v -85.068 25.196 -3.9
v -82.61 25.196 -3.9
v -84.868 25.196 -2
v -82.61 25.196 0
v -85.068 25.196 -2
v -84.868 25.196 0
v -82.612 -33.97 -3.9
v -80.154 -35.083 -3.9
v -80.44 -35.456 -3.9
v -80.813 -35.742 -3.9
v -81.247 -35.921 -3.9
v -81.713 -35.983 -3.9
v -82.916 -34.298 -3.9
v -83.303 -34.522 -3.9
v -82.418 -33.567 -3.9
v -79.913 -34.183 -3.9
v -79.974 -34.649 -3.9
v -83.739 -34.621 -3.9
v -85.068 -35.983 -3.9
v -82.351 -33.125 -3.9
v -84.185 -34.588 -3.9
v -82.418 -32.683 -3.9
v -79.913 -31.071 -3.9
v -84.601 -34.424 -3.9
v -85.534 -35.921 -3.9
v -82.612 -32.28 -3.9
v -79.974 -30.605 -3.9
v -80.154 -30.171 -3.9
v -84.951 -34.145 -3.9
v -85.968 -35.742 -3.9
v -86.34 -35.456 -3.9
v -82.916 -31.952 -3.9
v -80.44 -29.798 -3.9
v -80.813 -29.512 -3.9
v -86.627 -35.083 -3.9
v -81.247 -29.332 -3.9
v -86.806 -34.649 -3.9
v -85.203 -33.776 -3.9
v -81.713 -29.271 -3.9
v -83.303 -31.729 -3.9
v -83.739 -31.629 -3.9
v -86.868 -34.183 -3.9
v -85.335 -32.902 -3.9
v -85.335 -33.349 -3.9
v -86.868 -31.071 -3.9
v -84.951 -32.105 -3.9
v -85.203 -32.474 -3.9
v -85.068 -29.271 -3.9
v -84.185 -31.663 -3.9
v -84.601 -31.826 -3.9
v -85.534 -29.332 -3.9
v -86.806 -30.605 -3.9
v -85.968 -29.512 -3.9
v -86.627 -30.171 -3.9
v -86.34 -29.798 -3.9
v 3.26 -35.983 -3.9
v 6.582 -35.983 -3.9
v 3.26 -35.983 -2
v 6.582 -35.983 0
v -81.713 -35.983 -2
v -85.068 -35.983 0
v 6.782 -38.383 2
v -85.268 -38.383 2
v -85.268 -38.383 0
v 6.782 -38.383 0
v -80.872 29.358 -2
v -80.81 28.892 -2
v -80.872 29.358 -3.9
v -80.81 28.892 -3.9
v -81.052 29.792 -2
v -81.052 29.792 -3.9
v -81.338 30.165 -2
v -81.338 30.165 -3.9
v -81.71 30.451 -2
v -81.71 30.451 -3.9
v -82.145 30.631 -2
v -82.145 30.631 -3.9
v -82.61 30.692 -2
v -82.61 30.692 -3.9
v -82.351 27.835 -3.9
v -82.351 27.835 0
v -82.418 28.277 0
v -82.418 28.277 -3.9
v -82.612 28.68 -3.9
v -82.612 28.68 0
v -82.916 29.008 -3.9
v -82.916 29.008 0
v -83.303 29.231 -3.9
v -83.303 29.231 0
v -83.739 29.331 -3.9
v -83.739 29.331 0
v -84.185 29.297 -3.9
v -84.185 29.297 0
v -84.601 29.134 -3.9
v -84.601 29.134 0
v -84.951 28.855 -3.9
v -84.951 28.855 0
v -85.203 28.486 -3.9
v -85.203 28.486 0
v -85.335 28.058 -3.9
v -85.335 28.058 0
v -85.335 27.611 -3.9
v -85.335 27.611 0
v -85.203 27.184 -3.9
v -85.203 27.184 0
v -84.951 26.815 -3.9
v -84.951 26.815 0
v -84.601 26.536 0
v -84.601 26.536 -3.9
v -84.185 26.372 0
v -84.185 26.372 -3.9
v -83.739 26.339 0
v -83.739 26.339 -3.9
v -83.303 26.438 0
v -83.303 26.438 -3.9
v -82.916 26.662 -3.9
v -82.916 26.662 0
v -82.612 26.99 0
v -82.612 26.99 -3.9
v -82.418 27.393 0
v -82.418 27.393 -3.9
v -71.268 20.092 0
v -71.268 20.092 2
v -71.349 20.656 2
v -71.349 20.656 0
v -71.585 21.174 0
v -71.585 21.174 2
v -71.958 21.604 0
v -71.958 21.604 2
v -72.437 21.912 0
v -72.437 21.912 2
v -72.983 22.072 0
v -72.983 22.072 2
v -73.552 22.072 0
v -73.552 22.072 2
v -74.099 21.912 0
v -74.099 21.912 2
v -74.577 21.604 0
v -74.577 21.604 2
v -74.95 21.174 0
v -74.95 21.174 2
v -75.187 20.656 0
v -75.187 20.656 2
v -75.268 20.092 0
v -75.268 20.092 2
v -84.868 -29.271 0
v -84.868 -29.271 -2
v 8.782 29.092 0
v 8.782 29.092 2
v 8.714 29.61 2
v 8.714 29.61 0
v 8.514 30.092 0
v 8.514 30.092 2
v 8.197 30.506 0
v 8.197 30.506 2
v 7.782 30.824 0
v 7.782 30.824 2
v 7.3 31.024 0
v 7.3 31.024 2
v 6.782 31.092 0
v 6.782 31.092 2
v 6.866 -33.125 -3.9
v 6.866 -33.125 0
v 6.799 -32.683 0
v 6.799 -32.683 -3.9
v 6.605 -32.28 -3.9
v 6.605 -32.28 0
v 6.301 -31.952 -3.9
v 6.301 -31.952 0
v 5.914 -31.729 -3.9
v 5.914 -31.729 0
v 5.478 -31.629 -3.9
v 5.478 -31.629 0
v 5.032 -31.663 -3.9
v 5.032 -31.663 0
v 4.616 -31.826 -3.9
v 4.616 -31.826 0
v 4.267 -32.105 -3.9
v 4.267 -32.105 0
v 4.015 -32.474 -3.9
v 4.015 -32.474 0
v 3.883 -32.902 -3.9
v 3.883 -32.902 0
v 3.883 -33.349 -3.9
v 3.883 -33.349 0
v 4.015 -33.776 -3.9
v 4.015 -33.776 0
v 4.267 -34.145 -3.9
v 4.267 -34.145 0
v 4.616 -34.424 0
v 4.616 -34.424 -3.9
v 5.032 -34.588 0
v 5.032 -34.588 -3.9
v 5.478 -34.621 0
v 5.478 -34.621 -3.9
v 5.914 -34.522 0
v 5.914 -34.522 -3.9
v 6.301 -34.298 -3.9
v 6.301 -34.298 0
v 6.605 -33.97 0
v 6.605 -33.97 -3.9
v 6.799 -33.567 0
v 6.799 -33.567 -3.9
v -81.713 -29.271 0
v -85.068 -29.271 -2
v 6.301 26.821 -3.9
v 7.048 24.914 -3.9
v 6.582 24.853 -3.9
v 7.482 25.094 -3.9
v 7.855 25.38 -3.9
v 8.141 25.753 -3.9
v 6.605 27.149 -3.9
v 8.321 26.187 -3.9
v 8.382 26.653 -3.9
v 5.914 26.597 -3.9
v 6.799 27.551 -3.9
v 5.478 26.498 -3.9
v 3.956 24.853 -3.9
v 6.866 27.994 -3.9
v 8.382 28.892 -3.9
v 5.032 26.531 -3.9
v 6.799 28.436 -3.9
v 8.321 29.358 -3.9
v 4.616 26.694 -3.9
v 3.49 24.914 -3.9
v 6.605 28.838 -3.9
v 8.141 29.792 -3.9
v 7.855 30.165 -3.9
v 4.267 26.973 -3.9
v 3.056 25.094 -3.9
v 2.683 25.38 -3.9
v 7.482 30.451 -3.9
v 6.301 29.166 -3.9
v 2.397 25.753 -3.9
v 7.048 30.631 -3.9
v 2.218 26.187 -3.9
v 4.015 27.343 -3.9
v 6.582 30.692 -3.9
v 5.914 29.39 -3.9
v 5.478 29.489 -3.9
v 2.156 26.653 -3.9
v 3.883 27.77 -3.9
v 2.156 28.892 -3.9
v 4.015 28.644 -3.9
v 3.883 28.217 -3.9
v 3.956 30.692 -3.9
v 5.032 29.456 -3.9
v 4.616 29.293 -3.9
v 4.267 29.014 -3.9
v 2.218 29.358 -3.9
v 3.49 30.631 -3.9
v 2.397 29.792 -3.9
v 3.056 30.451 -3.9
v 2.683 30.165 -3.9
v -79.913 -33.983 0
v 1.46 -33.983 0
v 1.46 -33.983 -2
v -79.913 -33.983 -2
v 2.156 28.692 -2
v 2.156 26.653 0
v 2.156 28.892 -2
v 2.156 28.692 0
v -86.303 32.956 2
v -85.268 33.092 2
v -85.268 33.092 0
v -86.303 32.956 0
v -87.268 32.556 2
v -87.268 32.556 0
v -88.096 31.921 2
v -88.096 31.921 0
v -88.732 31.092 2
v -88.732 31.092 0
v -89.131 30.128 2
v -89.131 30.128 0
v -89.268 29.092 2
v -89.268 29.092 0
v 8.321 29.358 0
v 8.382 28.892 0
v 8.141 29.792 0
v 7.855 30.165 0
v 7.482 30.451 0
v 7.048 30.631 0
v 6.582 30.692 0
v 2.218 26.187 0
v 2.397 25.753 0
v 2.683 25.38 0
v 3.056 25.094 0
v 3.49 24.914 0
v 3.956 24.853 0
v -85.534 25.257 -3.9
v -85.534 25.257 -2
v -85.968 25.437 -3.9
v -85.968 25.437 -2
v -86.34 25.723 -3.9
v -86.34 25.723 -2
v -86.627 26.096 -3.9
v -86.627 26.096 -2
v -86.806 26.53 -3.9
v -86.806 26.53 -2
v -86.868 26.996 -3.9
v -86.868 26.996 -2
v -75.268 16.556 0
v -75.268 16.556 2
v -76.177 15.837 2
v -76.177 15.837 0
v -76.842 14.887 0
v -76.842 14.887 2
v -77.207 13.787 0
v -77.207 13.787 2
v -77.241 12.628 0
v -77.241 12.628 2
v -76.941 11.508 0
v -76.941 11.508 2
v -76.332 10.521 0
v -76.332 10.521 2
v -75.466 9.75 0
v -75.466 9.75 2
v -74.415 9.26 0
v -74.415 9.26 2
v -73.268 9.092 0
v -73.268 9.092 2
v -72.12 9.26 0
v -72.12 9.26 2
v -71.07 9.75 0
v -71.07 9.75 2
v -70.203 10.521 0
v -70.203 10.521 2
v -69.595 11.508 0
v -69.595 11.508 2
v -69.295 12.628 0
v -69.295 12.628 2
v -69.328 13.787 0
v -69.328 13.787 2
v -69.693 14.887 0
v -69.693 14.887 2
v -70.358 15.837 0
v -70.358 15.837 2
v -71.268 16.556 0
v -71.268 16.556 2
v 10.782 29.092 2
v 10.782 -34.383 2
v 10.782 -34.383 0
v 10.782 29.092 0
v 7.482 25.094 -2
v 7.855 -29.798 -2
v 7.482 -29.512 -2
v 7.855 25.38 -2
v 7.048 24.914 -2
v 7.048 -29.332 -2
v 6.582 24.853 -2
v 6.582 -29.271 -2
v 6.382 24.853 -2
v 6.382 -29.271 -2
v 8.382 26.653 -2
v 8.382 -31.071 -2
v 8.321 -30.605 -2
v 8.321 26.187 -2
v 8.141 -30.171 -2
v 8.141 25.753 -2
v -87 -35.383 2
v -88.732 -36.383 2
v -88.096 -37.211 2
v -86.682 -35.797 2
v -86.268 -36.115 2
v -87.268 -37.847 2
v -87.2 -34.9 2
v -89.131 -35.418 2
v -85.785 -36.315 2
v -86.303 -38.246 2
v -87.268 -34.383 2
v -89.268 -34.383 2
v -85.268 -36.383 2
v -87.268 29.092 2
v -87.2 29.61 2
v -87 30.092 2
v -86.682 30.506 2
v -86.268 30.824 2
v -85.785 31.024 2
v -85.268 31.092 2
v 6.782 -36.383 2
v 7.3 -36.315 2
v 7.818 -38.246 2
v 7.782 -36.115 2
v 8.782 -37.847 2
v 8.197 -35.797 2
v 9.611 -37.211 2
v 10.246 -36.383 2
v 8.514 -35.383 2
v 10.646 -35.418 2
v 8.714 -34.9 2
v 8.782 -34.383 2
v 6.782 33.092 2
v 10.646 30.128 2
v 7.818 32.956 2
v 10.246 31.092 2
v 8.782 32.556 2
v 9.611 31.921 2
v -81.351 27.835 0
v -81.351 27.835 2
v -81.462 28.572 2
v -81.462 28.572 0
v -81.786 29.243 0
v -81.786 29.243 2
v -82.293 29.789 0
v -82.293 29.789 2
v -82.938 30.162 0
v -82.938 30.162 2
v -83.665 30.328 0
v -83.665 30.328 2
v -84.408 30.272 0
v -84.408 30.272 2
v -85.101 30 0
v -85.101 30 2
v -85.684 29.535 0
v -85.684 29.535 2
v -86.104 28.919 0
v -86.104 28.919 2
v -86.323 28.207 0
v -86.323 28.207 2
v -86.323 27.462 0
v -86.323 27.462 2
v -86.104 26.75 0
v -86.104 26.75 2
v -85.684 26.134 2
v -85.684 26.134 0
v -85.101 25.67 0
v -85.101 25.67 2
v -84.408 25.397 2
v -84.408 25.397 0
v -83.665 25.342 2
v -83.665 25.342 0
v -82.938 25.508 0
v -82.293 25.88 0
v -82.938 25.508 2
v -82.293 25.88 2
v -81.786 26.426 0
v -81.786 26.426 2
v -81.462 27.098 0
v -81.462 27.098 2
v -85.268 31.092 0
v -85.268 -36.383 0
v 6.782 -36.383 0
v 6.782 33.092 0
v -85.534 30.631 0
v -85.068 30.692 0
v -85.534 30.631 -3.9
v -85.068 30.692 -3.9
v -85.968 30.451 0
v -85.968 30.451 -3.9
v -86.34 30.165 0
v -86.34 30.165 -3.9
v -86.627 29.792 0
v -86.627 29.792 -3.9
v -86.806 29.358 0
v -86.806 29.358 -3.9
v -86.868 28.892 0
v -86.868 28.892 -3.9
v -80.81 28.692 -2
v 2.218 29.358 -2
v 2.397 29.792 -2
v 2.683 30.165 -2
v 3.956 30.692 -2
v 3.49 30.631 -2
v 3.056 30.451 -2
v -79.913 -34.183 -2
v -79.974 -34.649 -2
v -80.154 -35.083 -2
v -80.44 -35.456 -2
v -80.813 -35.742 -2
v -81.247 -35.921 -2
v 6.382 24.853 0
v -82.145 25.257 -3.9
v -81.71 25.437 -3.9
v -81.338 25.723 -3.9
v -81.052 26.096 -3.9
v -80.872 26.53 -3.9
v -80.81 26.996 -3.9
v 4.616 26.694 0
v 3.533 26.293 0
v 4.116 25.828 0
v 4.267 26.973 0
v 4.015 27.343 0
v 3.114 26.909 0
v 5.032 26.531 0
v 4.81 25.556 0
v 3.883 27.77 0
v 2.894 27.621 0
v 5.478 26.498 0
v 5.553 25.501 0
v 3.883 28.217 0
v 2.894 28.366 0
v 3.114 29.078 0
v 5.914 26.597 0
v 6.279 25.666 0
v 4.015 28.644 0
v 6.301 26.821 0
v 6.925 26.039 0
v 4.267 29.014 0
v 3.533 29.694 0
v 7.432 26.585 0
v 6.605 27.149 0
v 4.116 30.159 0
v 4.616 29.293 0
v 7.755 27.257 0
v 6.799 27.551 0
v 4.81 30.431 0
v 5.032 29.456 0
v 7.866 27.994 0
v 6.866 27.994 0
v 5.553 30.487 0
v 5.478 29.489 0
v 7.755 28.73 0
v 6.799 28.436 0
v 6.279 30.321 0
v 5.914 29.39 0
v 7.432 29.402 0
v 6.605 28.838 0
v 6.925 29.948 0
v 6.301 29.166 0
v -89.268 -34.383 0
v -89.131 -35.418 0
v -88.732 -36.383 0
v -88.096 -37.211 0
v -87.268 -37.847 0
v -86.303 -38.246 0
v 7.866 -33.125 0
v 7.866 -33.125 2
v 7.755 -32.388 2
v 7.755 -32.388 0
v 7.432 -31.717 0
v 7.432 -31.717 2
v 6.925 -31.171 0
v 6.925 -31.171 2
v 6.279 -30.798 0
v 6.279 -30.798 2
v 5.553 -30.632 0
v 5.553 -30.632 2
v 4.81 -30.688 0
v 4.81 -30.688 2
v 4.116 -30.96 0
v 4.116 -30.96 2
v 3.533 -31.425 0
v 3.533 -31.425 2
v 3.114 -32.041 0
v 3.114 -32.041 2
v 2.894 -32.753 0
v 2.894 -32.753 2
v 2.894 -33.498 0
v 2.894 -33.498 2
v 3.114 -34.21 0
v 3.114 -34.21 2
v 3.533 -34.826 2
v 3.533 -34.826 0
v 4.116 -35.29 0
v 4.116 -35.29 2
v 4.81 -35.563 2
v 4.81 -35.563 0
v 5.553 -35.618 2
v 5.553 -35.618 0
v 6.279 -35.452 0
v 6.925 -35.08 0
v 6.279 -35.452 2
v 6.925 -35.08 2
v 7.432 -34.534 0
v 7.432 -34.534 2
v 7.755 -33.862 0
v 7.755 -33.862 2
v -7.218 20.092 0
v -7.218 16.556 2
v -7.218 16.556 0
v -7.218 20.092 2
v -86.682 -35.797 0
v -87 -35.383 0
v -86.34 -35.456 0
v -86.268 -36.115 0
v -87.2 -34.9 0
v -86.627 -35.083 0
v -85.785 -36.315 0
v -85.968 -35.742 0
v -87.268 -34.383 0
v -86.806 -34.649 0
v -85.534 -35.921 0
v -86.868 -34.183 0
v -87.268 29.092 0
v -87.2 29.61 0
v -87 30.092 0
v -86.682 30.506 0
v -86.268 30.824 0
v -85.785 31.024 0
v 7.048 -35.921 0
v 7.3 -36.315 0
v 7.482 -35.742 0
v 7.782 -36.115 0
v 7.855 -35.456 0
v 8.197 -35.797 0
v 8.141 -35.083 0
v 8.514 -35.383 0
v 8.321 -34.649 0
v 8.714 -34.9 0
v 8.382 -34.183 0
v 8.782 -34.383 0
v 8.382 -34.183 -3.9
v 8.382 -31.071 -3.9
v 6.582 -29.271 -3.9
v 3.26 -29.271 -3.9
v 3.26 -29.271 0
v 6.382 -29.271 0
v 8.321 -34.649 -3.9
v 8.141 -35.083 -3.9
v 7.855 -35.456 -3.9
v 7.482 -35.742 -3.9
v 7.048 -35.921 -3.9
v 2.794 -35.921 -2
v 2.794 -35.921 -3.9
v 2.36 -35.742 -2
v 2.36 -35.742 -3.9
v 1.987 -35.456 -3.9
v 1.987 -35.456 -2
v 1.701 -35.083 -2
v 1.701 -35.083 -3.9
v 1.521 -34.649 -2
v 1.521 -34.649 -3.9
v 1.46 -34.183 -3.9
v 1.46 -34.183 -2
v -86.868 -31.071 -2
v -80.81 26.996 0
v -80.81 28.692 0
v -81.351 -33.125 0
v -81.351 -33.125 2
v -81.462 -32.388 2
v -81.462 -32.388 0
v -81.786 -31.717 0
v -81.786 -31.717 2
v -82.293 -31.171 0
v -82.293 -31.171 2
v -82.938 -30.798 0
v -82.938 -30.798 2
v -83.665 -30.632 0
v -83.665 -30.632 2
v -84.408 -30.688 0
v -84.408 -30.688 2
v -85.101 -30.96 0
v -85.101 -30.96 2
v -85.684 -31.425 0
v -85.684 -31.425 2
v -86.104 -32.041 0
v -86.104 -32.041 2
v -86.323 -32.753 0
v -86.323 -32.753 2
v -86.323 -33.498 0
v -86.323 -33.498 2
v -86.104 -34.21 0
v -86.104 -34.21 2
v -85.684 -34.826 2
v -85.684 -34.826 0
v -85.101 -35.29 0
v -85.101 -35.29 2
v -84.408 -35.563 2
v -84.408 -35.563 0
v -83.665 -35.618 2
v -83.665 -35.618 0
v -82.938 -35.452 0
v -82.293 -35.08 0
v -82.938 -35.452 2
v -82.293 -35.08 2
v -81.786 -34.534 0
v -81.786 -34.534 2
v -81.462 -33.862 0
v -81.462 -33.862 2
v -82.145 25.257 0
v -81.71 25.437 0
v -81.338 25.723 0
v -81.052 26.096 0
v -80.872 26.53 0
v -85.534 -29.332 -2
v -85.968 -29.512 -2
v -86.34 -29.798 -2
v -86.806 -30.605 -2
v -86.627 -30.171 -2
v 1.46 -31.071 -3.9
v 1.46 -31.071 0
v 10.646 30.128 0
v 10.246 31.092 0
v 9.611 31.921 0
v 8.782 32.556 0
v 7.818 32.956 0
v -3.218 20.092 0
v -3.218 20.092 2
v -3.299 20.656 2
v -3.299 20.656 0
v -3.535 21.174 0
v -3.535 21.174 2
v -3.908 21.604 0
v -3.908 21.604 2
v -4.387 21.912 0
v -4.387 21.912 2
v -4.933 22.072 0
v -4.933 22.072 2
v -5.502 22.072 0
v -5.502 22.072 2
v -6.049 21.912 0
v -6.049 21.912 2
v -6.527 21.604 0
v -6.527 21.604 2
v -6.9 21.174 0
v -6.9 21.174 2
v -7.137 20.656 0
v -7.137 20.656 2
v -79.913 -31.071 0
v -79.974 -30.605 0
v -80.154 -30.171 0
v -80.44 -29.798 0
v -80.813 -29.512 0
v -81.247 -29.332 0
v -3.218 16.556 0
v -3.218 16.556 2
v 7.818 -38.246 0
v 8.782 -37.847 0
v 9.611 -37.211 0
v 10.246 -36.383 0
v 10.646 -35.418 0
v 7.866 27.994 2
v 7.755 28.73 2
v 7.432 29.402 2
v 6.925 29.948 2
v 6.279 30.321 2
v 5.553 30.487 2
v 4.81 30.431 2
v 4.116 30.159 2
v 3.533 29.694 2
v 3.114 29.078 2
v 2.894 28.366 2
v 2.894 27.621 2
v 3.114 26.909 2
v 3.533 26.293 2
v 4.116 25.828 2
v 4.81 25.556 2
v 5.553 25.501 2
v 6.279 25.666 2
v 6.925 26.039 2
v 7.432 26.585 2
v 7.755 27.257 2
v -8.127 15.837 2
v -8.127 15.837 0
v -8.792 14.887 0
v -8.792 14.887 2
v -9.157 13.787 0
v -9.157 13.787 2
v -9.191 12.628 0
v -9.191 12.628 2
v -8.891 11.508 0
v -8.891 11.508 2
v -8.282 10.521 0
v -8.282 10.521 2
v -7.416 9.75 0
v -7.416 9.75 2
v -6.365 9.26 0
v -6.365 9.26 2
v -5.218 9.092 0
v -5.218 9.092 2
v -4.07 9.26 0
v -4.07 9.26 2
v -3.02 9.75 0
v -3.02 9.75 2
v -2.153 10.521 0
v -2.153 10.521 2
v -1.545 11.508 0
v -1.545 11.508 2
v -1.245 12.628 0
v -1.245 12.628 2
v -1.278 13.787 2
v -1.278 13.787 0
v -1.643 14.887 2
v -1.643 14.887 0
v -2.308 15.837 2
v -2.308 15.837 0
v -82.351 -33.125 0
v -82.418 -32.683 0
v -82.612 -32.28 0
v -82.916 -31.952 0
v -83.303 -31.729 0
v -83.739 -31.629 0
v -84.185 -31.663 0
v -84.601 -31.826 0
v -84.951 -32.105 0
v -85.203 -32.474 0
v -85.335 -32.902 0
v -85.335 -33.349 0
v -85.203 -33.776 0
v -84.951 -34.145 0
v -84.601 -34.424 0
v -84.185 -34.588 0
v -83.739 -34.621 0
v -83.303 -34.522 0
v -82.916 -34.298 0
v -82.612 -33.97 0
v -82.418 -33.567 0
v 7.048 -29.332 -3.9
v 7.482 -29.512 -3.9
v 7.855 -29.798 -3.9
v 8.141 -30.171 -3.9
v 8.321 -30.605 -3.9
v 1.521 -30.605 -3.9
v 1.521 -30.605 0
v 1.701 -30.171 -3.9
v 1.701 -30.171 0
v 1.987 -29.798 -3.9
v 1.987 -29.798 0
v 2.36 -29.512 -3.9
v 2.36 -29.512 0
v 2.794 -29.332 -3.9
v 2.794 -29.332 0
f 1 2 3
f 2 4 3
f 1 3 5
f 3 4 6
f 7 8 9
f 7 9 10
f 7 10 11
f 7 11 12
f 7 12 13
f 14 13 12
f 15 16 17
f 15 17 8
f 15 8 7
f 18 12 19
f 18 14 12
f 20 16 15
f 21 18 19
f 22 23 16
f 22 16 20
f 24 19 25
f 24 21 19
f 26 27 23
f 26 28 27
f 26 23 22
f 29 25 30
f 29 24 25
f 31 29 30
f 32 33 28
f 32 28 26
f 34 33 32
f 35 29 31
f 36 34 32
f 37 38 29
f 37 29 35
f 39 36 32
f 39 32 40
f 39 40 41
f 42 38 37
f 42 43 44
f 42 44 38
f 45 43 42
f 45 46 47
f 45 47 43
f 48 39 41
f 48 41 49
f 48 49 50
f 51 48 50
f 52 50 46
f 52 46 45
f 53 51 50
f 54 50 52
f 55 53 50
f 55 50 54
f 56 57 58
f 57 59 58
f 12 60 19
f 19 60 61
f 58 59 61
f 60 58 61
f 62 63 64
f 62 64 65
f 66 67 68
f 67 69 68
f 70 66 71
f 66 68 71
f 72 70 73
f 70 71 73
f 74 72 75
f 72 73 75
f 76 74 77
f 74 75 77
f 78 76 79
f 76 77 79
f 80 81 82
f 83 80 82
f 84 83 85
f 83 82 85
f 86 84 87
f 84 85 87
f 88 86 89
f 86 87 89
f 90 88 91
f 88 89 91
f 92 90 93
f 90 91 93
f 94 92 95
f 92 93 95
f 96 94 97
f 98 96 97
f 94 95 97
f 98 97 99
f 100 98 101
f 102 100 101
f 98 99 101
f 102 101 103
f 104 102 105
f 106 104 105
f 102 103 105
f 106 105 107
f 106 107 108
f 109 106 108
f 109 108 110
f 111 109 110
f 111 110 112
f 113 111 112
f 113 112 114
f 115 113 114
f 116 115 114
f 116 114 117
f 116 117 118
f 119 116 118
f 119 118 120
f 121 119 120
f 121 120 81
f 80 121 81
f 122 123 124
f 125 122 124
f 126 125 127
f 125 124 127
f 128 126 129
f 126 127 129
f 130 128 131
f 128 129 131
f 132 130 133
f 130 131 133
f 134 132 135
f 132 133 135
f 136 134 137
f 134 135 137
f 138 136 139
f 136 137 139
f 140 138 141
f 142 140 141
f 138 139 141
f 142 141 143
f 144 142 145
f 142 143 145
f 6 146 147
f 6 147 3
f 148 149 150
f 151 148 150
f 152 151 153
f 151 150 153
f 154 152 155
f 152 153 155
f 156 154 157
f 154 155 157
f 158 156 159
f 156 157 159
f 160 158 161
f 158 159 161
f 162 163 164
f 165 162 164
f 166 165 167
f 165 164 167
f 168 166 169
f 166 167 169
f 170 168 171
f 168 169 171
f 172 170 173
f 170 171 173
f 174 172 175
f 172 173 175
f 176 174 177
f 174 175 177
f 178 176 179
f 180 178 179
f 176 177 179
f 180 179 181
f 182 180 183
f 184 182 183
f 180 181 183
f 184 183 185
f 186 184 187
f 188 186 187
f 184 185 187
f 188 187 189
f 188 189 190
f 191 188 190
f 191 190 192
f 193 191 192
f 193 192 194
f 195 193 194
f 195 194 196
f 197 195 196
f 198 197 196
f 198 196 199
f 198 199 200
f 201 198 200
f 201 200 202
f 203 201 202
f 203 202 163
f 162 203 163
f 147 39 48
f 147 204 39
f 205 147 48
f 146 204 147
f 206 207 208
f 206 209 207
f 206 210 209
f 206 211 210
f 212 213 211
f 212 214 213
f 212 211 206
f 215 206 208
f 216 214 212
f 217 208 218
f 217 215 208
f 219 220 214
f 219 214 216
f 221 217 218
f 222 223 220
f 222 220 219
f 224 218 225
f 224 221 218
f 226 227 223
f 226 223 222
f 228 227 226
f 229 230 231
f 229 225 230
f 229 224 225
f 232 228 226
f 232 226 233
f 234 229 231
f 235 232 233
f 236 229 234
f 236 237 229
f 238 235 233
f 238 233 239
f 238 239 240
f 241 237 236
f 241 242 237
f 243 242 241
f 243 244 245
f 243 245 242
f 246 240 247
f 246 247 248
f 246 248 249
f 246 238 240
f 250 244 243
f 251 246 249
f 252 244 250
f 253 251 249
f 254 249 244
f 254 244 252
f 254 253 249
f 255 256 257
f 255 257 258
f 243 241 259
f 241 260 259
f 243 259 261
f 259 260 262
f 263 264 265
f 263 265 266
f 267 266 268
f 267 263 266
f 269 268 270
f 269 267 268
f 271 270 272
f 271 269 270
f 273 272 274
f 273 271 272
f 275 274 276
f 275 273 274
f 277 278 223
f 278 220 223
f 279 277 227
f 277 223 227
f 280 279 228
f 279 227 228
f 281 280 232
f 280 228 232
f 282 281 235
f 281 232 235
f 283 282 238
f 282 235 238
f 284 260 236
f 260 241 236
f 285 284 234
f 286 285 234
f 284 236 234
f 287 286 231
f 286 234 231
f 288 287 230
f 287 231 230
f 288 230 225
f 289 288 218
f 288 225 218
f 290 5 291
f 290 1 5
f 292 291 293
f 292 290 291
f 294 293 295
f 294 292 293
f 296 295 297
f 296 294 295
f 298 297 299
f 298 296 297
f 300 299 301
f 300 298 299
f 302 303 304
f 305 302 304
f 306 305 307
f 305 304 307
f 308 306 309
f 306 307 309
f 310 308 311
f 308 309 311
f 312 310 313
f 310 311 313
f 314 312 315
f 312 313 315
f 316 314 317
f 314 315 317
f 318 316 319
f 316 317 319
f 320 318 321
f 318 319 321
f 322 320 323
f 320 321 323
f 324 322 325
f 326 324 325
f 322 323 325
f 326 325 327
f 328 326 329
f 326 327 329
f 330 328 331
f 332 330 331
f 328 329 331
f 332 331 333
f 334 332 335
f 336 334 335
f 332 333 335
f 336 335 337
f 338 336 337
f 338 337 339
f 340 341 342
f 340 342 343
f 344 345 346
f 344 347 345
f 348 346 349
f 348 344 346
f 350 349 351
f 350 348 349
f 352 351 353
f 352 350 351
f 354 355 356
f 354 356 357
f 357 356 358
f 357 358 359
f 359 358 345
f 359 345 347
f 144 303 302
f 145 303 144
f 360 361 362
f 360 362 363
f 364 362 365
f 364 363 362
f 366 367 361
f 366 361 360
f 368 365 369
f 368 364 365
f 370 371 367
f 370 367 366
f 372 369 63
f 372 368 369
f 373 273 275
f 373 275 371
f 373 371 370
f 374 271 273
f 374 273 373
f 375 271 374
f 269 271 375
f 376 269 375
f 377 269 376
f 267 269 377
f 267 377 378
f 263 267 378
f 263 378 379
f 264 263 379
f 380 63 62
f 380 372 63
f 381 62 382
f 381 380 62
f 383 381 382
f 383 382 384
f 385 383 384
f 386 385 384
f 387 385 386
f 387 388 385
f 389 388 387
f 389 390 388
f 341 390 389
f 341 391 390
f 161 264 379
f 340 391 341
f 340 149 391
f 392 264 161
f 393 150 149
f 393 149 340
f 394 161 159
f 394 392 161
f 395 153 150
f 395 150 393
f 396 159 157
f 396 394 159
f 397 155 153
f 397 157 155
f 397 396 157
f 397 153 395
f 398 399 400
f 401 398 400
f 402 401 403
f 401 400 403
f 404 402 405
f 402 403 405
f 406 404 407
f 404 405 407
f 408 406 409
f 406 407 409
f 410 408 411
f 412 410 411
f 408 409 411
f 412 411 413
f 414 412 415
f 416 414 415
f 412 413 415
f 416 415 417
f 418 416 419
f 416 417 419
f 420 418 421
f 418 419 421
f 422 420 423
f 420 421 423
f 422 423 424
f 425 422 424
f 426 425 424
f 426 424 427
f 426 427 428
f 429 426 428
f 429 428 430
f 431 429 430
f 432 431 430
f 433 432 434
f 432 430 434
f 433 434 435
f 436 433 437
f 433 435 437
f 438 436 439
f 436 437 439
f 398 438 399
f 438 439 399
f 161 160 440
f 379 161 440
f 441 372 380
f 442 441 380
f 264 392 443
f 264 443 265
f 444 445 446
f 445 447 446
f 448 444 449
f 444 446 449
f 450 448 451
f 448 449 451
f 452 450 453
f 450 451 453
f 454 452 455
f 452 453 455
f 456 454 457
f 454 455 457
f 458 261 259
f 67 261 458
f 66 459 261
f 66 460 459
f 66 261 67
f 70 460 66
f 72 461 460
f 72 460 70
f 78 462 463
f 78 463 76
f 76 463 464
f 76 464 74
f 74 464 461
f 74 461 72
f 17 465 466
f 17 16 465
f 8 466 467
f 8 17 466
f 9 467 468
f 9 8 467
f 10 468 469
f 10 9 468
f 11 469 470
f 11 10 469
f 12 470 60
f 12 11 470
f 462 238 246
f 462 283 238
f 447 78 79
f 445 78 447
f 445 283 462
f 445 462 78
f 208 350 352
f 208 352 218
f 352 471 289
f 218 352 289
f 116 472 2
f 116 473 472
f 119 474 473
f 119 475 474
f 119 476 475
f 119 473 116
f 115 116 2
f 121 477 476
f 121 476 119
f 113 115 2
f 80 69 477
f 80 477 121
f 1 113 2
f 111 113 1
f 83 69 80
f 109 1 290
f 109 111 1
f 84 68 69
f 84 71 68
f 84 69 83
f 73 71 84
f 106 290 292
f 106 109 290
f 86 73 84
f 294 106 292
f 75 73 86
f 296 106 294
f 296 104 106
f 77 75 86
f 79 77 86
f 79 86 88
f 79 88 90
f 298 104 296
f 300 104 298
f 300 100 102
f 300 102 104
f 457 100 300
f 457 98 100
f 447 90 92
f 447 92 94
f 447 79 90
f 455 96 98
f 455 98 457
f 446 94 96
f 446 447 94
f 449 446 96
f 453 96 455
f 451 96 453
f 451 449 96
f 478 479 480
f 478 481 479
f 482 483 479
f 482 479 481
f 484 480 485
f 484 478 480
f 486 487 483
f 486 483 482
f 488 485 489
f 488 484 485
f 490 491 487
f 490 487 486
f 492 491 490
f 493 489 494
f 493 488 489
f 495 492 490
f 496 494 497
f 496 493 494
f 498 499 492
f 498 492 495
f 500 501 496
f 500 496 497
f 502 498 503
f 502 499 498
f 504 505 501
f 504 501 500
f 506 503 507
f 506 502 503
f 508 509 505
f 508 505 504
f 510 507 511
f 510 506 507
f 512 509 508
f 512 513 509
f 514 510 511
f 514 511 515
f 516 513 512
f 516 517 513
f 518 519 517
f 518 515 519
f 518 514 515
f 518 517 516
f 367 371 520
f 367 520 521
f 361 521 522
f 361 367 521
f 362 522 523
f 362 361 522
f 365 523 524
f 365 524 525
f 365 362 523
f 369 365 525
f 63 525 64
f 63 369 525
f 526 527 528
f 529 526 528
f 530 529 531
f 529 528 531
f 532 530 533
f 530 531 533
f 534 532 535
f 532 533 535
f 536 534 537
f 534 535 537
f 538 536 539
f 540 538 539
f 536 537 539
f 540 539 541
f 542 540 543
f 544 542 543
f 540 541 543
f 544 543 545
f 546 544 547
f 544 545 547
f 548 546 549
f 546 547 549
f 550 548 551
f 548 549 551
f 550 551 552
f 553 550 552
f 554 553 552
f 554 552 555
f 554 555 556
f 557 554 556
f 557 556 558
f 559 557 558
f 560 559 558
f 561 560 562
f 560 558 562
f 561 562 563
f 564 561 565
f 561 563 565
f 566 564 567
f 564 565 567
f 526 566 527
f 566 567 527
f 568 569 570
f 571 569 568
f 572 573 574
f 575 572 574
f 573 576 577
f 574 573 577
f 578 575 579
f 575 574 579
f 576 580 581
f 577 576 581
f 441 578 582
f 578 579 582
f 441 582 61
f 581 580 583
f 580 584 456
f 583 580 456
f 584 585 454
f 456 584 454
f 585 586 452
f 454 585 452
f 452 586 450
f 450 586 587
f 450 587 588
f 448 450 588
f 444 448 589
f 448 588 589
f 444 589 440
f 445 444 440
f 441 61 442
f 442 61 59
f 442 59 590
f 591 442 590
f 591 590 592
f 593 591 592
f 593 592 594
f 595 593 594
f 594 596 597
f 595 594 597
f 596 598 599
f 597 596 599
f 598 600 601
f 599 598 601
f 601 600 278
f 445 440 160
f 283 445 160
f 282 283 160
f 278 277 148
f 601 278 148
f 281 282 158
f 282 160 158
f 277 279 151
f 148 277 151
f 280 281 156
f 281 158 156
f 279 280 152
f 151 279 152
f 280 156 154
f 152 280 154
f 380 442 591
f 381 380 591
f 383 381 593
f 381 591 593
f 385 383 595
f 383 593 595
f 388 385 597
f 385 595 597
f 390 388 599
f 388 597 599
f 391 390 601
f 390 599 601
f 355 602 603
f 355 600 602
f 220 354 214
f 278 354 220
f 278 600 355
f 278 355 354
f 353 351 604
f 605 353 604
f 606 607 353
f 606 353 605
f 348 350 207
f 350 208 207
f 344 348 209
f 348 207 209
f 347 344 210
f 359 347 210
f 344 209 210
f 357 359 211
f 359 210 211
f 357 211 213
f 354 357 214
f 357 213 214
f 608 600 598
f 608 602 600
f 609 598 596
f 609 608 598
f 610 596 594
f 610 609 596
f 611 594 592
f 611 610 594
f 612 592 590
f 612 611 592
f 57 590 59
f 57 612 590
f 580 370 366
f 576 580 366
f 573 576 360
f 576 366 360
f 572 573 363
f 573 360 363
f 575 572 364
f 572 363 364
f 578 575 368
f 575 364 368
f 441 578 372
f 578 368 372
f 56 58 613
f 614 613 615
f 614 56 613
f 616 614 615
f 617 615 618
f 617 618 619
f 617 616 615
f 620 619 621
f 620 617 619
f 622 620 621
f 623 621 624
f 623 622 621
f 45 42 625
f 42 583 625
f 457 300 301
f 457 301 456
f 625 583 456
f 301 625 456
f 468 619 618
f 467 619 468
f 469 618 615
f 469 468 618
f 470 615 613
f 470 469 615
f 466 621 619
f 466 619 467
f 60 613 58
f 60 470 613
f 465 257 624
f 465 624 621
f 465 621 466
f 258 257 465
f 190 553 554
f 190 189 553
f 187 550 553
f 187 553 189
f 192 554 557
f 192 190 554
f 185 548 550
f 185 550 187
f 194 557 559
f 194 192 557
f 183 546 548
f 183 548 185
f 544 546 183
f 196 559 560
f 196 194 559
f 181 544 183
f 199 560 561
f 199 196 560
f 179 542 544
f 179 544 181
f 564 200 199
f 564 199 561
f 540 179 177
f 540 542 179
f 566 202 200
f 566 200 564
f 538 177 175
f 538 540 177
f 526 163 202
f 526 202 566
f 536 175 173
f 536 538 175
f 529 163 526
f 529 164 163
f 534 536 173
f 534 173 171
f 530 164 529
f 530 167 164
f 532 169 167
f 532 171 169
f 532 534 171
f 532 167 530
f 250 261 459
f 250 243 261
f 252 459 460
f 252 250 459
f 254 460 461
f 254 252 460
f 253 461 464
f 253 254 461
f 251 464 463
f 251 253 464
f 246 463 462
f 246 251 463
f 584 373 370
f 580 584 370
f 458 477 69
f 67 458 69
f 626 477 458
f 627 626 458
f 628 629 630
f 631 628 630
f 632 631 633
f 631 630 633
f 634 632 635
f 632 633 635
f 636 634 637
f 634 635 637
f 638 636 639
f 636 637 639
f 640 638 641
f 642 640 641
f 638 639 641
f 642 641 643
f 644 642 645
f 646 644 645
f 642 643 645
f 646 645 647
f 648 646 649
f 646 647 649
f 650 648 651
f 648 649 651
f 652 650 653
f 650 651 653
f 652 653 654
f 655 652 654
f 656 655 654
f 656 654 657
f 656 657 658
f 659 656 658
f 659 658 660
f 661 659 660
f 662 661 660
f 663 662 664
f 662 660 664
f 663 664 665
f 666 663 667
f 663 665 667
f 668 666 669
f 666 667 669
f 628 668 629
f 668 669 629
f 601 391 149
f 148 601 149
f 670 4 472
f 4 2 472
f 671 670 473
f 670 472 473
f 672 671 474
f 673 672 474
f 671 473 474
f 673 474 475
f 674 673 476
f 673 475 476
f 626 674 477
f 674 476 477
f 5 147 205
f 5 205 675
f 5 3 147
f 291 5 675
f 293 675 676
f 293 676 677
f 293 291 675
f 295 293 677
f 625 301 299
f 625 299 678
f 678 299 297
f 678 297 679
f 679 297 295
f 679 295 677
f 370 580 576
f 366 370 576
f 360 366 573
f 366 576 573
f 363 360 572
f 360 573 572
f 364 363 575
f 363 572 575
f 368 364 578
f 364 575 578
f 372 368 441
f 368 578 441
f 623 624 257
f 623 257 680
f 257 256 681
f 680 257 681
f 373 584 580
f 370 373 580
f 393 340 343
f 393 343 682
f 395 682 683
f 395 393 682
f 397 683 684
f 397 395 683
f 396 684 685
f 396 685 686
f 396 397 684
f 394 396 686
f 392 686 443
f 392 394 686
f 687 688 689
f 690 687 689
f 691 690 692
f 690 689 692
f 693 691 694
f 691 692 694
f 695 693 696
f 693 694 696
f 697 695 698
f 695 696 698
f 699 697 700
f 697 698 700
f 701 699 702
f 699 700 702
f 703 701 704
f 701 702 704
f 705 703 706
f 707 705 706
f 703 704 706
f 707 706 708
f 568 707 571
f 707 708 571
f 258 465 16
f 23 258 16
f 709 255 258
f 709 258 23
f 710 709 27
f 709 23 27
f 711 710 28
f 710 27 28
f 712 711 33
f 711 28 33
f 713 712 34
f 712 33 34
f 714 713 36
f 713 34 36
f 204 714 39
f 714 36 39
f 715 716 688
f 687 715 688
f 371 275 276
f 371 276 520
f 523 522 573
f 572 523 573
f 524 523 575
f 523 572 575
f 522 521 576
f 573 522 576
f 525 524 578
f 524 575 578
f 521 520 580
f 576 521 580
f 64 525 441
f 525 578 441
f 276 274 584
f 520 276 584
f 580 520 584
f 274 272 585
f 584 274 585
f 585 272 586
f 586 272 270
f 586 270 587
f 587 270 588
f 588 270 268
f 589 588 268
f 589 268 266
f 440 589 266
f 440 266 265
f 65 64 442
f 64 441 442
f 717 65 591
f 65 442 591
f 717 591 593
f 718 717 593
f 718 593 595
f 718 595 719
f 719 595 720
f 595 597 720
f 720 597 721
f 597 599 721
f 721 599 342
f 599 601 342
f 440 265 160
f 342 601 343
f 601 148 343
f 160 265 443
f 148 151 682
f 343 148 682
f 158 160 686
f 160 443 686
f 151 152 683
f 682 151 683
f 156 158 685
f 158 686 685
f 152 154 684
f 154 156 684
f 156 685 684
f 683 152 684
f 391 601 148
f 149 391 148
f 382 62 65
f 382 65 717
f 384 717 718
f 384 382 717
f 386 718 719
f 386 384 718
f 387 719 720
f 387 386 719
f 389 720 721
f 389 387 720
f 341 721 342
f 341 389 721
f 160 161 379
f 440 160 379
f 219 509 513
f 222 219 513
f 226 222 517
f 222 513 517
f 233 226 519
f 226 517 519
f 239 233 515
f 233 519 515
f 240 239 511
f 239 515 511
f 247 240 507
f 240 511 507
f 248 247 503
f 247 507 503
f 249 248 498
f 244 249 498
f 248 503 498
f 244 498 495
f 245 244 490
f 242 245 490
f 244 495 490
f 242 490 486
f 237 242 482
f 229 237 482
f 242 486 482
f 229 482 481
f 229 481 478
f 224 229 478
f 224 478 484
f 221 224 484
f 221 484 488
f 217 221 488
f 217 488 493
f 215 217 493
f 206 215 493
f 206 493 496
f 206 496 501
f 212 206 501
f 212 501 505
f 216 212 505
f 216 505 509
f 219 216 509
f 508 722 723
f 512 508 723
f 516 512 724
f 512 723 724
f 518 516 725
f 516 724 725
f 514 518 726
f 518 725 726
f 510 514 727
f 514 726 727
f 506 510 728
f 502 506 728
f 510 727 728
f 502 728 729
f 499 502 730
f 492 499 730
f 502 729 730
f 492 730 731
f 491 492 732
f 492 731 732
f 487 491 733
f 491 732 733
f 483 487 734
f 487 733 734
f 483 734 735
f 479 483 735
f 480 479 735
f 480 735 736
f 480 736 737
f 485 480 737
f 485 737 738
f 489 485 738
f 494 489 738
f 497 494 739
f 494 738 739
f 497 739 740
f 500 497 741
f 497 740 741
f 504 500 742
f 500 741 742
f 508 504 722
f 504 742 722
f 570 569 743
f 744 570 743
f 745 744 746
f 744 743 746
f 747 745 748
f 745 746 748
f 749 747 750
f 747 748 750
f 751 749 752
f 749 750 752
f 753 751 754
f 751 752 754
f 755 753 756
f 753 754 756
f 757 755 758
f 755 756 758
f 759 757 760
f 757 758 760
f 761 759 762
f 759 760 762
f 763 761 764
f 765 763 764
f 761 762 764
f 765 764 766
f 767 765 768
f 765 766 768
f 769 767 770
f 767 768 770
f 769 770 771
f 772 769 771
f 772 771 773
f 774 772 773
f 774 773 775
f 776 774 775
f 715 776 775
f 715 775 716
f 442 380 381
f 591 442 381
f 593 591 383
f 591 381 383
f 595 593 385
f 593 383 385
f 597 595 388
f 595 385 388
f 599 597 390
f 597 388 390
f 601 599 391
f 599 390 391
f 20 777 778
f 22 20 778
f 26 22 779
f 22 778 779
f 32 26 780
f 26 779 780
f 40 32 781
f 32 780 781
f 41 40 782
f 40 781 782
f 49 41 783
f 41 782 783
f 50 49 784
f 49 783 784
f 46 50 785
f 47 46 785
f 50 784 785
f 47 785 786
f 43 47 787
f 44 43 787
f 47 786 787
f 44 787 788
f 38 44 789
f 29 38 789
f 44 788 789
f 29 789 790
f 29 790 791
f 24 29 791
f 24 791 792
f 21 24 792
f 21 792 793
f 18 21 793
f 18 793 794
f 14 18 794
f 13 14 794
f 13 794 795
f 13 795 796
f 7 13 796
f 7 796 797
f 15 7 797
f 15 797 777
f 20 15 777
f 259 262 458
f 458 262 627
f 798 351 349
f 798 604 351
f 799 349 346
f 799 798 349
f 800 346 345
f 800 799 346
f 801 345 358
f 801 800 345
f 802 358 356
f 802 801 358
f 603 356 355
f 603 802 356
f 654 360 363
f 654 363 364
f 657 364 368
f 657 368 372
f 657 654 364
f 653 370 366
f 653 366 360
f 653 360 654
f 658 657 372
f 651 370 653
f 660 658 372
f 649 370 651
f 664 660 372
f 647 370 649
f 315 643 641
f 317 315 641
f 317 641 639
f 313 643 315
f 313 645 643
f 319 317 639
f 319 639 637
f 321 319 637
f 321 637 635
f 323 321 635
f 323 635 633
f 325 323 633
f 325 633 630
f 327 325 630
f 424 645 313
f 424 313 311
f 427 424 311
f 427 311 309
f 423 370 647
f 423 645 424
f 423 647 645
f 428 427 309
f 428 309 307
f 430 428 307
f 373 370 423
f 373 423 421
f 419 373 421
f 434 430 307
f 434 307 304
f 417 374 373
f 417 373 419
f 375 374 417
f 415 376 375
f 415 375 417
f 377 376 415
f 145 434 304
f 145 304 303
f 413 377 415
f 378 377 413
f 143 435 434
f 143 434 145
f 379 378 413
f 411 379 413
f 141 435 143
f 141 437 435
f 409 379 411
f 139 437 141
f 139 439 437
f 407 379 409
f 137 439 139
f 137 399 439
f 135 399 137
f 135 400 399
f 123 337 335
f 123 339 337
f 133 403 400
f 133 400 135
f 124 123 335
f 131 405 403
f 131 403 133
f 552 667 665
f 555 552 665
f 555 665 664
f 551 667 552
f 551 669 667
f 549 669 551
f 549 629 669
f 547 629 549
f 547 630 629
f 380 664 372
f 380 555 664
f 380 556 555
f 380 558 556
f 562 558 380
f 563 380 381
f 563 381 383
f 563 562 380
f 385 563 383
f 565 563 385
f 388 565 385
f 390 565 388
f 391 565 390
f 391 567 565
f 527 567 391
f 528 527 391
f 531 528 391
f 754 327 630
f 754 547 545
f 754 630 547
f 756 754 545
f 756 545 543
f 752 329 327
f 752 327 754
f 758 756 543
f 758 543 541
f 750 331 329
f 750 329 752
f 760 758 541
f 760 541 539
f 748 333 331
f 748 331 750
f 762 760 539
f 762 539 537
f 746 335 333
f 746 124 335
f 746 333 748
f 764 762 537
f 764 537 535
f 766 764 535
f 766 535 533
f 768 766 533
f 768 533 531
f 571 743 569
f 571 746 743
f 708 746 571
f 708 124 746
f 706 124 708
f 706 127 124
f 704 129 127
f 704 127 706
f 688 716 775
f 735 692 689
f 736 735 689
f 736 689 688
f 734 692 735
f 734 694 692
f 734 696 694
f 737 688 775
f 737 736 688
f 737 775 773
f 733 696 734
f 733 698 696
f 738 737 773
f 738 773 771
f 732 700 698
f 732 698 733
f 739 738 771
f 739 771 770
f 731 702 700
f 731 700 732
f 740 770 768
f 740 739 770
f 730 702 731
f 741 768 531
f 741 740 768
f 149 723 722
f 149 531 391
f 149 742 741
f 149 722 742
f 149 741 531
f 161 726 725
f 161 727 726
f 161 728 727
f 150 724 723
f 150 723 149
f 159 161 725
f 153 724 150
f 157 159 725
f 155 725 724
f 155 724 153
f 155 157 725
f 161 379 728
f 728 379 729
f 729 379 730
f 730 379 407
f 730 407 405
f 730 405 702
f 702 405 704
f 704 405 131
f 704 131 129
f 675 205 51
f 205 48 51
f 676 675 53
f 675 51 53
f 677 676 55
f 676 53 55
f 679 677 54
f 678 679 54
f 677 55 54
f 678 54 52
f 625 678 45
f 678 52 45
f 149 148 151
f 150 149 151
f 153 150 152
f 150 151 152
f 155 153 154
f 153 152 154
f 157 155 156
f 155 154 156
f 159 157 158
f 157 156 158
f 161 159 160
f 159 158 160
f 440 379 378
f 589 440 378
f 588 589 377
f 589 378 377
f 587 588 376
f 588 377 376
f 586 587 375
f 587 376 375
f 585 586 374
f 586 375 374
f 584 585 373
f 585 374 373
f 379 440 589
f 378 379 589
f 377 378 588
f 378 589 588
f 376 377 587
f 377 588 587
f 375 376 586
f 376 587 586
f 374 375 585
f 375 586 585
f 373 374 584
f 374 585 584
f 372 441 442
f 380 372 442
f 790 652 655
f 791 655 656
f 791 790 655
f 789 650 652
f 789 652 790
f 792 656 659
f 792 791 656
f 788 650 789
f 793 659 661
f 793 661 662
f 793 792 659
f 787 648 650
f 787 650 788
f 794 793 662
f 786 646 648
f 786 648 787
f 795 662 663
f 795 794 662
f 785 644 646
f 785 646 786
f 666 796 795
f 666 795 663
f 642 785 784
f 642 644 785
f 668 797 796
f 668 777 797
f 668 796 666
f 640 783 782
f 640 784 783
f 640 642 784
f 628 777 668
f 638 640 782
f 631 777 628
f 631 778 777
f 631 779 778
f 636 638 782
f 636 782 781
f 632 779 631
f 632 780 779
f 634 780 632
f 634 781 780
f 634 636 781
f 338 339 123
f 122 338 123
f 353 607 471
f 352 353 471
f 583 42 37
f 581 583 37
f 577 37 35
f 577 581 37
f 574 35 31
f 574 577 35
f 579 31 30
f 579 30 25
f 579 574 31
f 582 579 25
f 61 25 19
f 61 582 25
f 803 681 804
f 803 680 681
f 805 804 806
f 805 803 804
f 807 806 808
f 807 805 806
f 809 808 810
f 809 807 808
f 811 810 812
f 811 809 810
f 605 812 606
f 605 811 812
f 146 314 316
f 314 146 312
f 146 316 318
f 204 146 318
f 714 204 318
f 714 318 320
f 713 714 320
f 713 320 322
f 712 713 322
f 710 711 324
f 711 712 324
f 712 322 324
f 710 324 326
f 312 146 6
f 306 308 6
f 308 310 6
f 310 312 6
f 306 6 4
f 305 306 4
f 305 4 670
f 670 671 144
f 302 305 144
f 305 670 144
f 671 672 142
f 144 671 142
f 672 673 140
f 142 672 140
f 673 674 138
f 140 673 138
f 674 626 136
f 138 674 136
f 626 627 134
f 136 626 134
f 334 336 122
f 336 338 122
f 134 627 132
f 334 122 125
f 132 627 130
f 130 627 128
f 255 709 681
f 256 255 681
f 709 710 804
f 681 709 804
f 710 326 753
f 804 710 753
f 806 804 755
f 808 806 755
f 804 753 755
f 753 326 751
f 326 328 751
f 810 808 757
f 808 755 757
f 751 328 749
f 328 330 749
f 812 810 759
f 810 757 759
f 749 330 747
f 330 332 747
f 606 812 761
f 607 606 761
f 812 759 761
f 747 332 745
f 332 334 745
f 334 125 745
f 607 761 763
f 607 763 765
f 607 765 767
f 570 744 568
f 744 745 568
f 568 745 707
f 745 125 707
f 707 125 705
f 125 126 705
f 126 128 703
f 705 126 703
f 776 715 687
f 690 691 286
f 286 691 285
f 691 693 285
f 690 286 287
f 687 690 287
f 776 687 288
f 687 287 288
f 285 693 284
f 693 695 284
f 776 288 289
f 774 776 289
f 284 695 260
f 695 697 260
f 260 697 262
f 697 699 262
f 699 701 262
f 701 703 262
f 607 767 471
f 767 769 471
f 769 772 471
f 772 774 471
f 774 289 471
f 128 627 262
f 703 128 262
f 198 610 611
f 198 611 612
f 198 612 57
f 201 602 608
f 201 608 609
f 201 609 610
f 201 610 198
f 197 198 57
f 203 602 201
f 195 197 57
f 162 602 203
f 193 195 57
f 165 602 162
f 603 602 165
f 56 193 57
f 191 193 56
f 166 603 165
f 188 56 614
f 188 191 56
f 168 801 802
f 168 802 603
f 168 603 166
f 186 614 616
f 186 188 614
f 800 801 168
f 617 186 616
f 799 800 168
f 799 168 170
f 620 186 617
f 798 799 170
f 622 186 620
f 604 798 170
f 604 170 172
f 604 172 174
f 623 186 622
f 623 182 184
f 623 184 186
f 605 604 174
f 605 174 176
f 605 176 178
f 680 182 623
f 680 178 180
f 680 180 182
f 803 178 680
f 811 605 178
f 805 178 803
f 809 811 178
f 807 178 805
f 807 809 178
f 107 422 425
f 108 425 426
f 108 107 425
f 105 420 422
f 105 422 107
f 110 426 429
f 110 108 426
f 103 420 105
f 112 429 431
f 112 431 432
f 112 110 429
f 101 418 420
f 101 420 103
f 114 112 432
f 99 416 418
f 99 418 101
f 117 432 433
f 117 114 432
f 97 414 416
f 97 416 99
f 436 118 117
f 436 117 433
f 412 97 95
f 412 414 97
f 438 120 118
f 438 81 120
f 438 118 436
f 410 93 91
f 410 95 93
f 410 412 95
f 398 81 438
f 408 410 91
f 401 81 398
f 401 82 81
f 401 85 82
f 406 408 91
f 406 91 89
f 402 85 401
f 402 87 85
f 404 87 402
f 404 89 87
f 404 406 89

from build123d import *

# Parameters (mm, degrees)
AUFSATZ_LINEAR_AUSTRAGEN1_DEPTH      = 2
SKIZZE4_W                            = 95.25
SKIZZE4_H                            = 66.675
SKIZZE4_W_2                          = 91.25
SKIZZE4_H_2                          = 62.675
LINEAR_AUSTRAGEN_D_NN1_DEPTH         = 2
SKIZZE6_W                            = 6.226087216
SKIZZE6_H                            = 5.839692789
SKIZZE6_W_2                          = 6.057243249
SKIZZE6_H_2                          = 5.496638274
SKIZZE6_W_3                          = 6.955123198
SKIZZE6_H_3                          = 6.71155976
SKIZZE6_W_4                          = 6.922640051
AUFSATZ_LINEAR_AUSTRAGEN2_DEPTH      = 3.9
VERRUNDUNG2_R                        = 1.8
VERRUNDUNG3_R                        = 1.8
VERRUNDUNG4_R                        = 1.8
SKIZZE7_R                            = 1.5
SCHNITT_LINEAR_AUSTRAGEN1_DEPTH      = 6
SKIZZE8_R                            = 2.5
SCHNITT_LINEAR_AUSTRAGEN2_DEPTH      = 2
SKIZZE9_R                            = 4
SCHNITT_LINEAR_AUSTRAGEN3_DEPTH      = 2
SKIZZE10_R                           = 2
SCHNITT_LINEAR_AUSTRAGEN5_DEPTH      = 2
SKIZZE11_W                           = 4
SKIZZE11_H                           = 4.308003348
SCHNITT_LINEAR_AUSTRAGEN6_DEPTH      = 2
SCHNITT_LINEAR_AUSTRAGEN_D_NN1_START = -2
SCHNITT_LINEAR_AUSTRAGEN_D_NN1_DEPTH = 2
LINEAR_AUSTRAGEN_D_NN2_DEPTH         = 2


with BuildPart() as part:
    # Skizze3 → Aufsatz-Linear austragen1 (new body)
    with BuildSketch(Plane.XY):
        with BuildLine():
            Line((-89.26767695, 29.092284131), (-89.26767695, -34.382715869))
            ThreePointArc((-89.26767695, -34.382715869), (-88.096104074, -37.211142994), (-85.26767695, -38.382715869))
            Line((-85.26767695, -38.382715869), (6.78232305, -38.382715869))
            ThreePointArc((6.78232305, -38.382715869), (9.610750175, -37.211142994), (10.78232305, -34.382715869))
            Line((10.78232305, -34.382715869), (10.78232305, 29.092284131))
            ThreePointArc((10.78232305, 29.092284131), (9.610750175, 31.920711255), (6.78232305, 33.092284131))
            Line((6.78232305, 33.092284131), (-85.26767695, 33.092284131))
            ThreePointArc((-85.26767695, 33.092284131), (-88.096104074, 31.920711255), (-89.26767695, 29.092284131))
        make_face()
    extrude(amount=AUFSATZ_LINEAR_AUSTRAGEN1_DEPTH)

    # Skizze4 → Linear-Austragen-Dünn1 (add)
    with BuildSketch(Plane(origin=(0, 0, 0), x_dir=(-1, 0, 0), z_dir=(0, 0, -1))):
        with Locations((39.24267695, -2.645215869)):
            Rectangle(SKIZZE4_W, SKIZZE4_H)
        with Locations((39.24267695, -2.645215869)):
            Rectangle(SKIZZE4_W_2, SKIZZE4_H_2, mode=Mode.SUBTRACT)
    extrude(amount=LINEAR_AUSTRAGEN_D_NN1_DEPTH)

    # Skizze6 → Aufsatz-Linear austragen2 (add)
    with BuildSketch(Plane(origin=(0, 0, 0), x_dir=(-1, 0, 0), z_dir=(0, 0, -1))):
        with Locations((-5.269279442, 27.772437737)):
            Rectangle(SKIZZE6_W, SKIZZE6_H)
        with Locations((83.839055325, 27.943964994)):
            Rectangle(SKIZZE6_W_2, SKIZZE6_H_2)
        with Locations((83.390115351, -32.626935989)):
            Rectangle(SKIZZE6_W_3, SKIZZE6_H_3)
        with Locations((-4.921003025, -32.626935989)):
            Rectangle(SKIZZE6_W_4, SKIZZE6_H_3)
    extrude(amount=AUFSATZ_LINEAR_AUSTRAGEN2_DEPTH)

    # Verrundung2
    verrundung2_edges = [part.edges().sort_by_distance(p)[0] for p in [
        (8.38232305, 30.692284131, -1.95),
        (8.38232305, -35.982715869, -1.95),
        (-86.86767695, -35.982715869, -1.95),
        (-86.86767695, 30.692284131, -1.95),
    ]]
    fillet(verrundung2_edges, radius=VERRUNDUNG2_R)

    # Verrundung3
    verrundung3_edges = [part.edges().sort_by_distance(p)[0] for p in [
        (-79.912553752, -29.271156109, -1.95),
        (1.459682999, -29.271156109, -1.95),
        (2.156235834, 24.852591342, -1.95),
        (-80.810433701, 25.195645857, -1.95),
    ]]
    fillet(verrundung3_edges, radius=VERRUNDUNG3_R)

    # Verrundung4
    verrundung4_edges = [part.edges().sort_by_distance(p)[0] for p in [
        (-86.86767695, -29.271156109, -2.95),
        (-79.912553752, -35.982715869, -2.95),
        (8.38232305, -29.271156109, -2.95),
        (1.459682999, -35.982715869, -2.95),
        (8.38232305, 24.852591342, -2.95),
        (2.156235834, 30.692284131, -2.95),
        (-86.86767695, 25.195645857, -2.95),
        (-80.810433701, 30.692284131, -2.95),
    ]]
    fillet(verrundung4_edges, radius=VERRUNDUNG4_R)

    # Skizze7 → Schnitt-Linear austragen1 (cut)
    with BuildSketch(Plane.XY.offset(2)):
        with Locations((-83.851410283, 27.834784131)):
            Circle(SKIZZE7_R)
        with Locations((5.366089717, 27.993517464)):
            Circle(SKIZZE7_R)
        with Locations((-83.851410283, -33.125215869)):
            Circle(SKIZZE7_R)
        with Locations((5.366089717, -33.125215869)):
            Circle(SKIZZE7_R)
    extrude(amount=-SCHNITT_LINEAR_AUSTRAGEN1_DEPTH, mode=Mode.SUBTRACT)

    # Skizze8 → Schnitt-Linear austragen2 (cut)
    with BuildSketch(Plane.XY.offset(2)):
        with Locations((-83.851410283, 27.834784131)):
            Circle(SKIZZE8_R)
        with Locations((-83.851410283, -33.125215869)):
            Circle(SKIZZE8_R)
        with Locations((5.366089717, -33.125215869)):
            Circle(SKIZZE8_R)
        with Locations((5.366089717, 27.993517464)):
            Circle(SKIZZE8_R)
    extrude(amount=-SCHNITT_LINEAR_AUSTRAGEN2_DEPTH, mode=Mode.SUBTRACT)

    # Skizze9 → Schnitt-Linear austragen3 (cut)
    with BuildSketch(Plane.XY.offset(2)):
        with Locations((-73.26767695, 13.092284131)):
            Circle(SKIZZE9_R)
        with Locations((-5.21767695, 13.092284131)):
            Circle(SKIZZE9_R)
    extrude(amount=-SCHNITT_LINEAR_AUSTRAGEN3_DEPTH, mode=Mode.SUBTRACT)

    # Skizze10 → Schnitt-Linear austragen5 (cut)
    with BuildSketch(Plane.XY.offset(2)):
        with Locations((-73.26767695, 20.092284131)):
            Circle(SKIZZE10_R)
        with Locations((-5.21767695, 20.092284131)):
            Circle(SKIZZE10_R)
    extrude(amount=-SCHNITT_LINEAR_AUSTRAGEN5_DEPTH, mode=Mode.SUBTRACT)

    # Skizze11 → Schnitt-Linear austragen6 (cut)
    with BuildSketch(Plane.XY.offset(2)):
        with Locations((-73.26767695, 17.938282457)):
            Rectangle(SKIZZE11_W, SKIZZE11_H)
        with Locations((-5.21767695, 17.938282457)):
            Rectangle(SKIZZE11_W, SKIZZE11_H)
    extrude(amount=-SCHNITT_LINEAR_AUSTRAGEN6_DEPTH, mode=Mode.SUBTRACT)

    # Skizze12 → Schnitt-Linear-Austragen-Dünn1 (cut)
    with BuildSketch(Plane.XY.offset(2).offset(SCHNITT_LINEAR_AUSTRAGEN_D_NN1_START)):
        with BuildLine():
            Line((6.78232305, 33.092284131), (-85.26767695, 33.092284131))
            ThreePointArc((-85.26767695, 33.092284131), (-88.096104074, 31.920711255), (-89.26767695, 29.092284131))
            Line((-89.26767695, 29.092284131), (-89.26767695, -34.382715869))
            ThreePointArc((-89.26767695, -34.382715869), (-88.096104074, -37.211142994), (-85.26767695, -38.382715869))
            Line((-85.26767695, -38.382715869), (6.78232305, -38.382715869))
            ThreePointArc((6.78232305, -38.382715869), (9.610750175, -37.211142994), (10.78232305, -34.382715869))
            Line((10.78232305, -34.382715869), (10.78232305, 29.092284131))
            ThreePointArc((10.78232305, 29.092284131), (9.610750175, 31.920711255), (6.78232305, 33.092284131))
        make_face()
        with BuildLine():
            Line((6.78232305, 31.092284131), (-85.26767695, 31.092284131))
            ThreePointArc((-85.26767695, 31.092284131), (-86.681890512, 30.506497693), (-87.26767695, 29.092284131))
            Line((-87.26767695, 29.092284131), (-87.26767695, -34.382715869))
            ThreePointArc((-87.26767695, -34.382715869), (-86.681890512, -35.796929432), (-85.26767695, -36.382715869))
            Line((-85.26767695, -36.382715869), (6.78232305, -36.382715869))
            ThreePointArc((6.78232305, -36.382715869), (8.196536613, -35.796929432), (8.78232305, -34.382715869))
            Line((8.78232305, -34.382715869), (8.78232305, 29.092284131))
            ThreePointArc((8.78232305, 29.092284131), (8.196536613, 30.506497693), (6.78232305, 31.092284131))
        make_face(mode=Mode.SUBTRACT)
    extrude(amount=SCHNITT_LINEAR_AUSTRAGEN_D_NN1_DEPTH, mode=Mode.SUBTRACT)


with BuildPart() as body_2:
    # Skizze12<2> → Linear-Austragen-Dünn2 (new body)
    with BuildSketch(Plane.XY.offset(2)):
        with BuildLine():
            Line((6.78232305, 33.092284131), (-85.26767695, 33.092284131))
            ThreePointArc((-85.26767695, 33.092284131), (-88.096104074, 31.920711255), (-89.26767695, 29.092284131))
            Line((-89.26767695, 29.092284131), (-89.26767695, -34.382715869))
            ThreePointArc((-89.26767695, -34.382715869), (-88.096104074, -37.211142994), (-85.26767695, -38.382715869))
            Line((-85.26767695, -38.382715869), (6.78232305, -38.382715869))
            ThreePointArc((6.78232305, -38.382715869), (9.610750175, -37.211142994), (10.78232305, -34.382715869))
            Line((10.78232305, -34.382715869), (10.78232305, 29.092284131))
            ThreePointArc((10.78232305, 29.092284131), (9.610750175, 31.920711255), (6.78232305, 33.092284131))
        make_face()
        with BuildLine():
            Line((6.78232305, 31.092284131), (-85.26767695, 31.092284131))
            ThreePointArc((-85.26767695, 31.092284131), (-86.681890512, 30.506497693), (-87.26767695, 29.092284131))
            Line((-87.26767695, 29.092284131), (-87.26767695, -34.382715869))
            ThreePointArc((-87.26767695, -34.382715869), (-86.681890512, -35.796929432), (-85.26767695, -36.382715869))
            Line((-85.26767695, -36.382715869), (6.78232305, -36.382715869))
            ThreePointArc((6.78232305, -36.382715869), (8.196536613, -35.796929432), (8.78232305, -34.382715869))
            Line((8.78232305, -34.382715869), (8.78232305, 29.092284131))
            ThreePointArc((8.78232305, 29.092284131), (8.196536613, 30.506497693), (6.78232305, 31.092284131))
        make_face(mode=Mode.SUBTRACT)
    extrude(amount=-LINEAR_AUSTRAGEN_D_NN2_DEPTH)


solid = Compound([part.part, body_2.part])
